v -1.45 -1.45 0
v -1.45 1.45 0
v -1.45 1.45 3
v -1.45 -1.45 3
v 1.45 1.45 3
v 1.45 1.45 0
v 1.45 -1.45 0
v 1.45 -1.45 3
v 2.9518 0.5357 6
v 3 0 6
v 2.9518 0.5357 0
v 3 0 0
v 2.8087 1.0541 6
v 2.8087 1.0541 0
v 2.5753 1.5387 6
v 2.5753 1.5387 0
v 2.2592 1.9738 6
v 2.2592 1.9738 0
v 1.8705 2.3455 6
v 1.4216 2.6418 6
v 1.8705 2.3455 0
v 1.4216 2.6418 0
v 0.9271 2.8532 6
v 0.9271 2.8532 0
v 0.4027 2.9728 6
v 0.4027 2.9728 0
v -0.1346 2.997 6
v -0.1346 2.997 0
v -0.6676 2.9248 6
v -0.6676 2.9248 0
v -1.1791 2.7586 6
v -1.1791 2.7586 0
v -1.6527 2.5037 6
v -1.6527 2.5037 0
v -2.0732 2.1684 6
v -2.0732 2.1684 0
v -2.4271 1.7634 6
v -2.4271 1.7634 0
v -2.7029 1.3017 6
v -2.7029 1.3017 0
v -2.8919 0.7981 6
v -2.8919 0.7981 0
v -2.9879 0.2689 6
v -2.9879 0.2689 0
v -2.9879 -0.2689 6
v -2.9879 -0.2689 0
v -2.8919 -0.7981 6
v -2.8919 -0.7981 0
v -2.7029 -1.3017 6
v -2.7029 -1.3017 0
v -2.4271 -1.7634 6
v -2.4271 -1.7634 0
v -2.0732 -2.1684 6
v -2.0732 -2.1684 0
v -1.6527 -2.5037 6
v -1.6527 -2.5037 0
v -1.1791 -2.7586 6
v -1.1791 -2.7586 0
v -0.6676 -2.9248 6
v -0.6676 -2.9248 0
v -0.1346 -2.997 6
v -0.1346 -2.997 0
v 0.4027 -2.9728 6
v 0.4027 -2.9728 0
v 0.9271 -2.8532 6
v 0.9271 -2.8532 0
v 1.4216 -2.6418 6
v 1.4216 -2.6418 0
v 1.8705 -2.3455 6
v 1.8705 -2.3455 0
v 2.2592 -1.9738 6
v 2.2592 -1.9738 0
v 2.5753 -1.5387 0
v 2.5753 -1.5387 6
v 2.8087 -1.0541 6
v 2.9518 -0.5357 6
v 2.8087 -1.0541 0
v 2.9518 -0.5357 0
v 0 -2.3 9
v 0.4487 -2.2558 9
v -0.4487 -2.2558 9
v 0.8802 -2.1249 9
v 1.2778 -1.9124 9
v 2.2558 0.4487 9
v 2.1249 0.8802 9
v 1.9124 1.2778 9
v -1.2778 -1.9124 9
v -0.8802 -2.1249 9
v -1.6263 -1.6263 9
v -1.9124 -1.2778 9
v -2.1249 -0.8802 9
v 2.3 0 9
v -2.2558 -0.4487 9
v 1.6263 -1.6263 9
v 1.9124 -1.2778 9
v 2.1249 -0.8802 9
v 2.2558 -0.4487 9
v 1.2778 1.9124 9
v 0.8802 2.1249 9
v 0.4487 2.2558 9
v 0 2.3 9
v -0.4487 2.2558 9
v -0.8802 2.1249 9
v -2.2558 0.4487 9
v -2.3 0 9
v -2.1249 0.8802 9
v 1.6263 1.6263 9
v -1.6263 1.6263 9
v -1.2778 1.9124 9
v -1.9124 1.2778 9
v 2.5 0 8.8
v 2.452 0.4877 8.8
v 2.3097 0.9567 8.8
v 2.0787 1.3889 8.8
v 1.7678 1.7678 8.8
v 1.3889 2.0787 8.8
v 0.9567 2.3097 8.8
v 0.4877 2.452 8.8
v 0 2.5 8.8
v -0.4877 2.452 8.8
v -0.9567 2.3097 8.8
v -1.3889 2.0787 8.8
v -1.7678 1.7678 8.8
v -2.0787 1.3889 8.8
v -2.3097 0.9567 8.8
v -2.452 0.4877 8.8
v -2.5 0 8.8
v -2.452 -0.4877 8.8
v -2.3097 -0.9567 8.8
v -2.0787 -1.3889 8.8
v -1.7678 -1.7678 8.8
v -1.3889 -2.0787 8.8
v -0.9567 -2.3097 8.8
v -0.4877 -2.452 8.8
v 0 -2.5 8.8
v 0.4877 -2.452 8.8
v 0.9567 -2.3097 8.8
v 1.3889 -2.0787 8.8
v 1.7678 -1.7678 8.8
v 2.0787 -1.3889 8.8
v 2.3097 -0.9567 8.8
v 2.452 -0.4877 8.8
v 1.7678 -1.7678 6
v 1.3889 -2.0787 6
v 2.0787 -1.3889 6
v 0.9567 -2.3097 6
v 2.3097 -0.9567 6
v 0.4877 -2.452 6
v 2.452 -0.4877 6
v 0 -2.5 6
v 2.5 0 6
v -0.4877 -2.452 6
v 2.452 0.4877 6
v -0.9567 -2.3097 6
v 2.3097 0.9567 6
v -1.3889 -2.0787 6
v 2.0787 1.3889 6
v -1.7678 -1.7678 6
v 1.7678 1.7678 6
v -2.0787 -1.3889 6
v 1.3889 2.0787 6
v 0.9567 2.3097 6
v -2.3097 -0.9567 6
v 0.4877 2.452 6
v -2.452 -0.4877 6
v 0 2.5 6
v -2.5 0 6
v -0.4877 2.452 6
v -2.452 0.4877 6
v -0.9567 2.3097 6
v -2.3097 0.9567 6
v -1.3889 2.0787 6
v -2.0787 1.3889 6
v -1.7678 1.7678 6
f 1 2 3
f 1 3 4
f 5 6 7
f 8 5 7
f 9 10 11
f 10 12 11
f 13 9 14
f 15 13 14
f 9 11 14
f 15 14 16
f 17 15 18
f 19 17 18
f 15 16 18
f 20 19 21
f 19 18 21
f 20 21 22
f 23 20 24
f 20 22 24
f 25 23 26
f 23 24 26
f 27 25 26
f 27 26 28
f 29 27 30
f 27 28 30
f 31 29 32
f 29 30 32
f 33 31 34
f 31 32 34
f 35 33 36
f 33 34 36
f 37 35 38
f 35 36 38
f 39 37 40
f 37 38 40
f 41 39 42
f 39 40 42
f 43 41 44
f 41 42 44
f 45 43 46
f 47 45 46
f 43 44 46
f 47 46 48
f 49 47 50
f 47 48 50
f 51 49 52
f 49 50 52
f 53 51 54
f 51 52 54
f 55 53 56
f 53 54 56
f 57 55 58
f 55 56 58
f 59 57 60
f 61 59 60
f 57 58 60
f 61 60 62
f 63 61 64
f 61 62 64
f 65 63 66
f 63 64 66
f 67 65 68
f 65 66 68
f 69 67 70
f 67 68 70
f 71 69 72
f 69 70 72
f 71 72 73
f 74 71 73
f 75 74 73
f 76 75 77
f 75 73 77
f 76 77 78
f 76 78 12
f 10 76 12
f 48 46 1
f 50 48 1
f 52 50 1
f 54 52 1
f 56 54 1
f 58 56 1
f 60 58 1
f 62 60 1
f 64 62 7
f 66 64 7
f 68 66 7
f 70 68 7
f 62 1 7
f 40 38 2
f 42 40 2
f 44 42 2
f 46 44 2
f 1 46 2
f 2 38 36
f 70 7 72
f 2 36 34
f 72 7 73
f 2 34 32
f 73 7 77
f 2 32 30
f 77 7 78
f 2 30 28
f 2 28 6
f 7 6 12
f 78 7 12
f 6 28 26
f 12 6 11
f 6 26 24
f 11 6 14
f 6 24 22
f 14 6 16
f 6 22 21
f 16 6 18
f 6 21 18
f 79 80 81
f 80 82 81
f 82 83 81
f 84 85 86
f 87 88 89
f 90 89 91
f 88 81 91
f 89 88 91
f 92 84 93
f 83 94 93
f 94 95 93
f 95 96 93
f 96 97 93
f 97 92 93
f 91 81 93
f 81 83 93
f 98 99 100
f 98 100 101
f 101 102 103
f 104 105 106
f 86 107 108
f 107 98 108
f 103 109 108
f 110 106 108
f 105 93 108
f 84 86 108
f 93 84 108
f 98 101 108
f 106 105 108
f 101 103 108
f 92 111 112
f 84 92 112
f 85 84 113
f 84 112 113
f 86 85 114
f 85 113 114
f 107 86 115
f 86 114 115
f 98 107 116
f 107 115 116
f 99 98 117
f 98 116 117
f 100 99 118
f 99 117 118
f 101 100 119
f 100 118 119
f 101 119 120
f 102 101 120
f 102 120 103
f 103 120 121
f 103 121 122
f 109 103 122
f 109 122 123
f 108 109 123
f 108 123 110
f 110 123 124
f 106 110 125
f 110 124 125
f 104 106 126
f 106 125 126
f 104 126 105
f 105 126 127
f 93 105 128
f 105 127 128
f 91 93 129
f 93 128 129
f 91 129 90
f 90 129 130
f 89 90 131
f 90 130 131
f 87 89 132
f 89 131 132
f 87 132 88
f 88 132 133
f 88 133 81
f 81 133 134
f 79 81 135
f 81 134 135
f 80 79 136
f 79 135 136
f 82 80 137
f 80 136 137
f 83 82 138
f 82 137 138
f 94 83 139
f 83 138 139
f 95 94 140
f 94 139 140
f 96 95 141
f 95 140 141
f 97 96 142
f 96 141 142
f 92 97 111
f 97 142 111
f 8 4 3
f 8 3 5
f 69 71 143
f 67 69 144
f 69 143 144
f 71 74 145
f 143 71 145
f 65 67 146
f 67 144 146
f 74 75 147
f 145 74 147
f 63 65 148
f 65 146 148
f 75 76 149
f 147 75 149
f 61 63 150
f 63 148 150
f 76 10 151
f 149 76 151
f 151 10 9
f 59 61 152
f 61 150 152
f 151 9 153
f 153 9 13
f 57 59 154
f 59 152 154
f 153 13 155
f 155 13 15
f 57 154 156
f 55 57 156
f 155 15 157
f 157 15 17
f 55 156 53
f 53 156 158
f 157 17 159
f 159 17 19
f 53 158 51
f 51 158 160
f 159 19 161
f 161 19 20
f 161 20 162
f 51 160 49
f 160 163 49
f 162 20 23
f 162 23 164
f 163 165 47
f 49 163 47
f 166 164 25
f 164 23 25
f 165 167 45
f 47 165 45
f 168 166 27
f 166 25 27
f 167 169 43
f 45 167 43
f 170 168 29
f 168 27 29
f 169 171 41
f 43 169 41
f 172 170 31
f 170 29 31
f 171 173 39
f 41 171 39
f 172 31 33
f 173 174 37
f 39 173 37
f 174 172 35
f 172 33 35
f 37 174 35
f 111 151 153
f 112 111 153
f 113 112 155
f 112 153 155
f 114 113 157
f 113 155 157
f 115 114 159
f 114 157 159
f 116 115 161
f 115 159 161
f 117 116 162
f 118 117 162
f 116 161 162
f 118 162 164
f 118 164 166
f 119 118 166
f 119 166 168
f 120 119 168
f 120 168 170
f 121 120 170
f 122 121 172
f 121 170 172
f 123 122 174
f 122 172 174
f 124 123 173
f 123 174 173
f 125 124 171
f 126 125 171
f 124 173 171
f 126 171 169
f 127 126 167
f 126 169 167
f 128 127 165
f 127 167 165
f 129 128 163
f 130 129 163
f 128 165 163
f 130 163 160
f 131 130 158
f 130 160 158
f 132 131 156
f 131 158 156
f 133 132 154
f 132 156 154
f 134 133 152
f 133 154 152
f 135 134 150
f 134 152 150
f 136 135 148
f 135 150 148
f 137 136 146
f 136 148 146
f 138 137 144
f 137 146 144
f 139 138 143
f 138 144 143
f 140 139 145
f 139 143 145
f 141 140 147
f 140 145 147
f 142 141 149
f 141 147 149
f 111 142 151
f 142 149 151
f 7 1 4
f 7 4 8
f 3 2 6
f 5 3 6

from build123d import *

# Parameters (mm, degrees)
SKETCH001_W  = 2.9
SKETCH001_H  = 2.9
POCKET_DEPTH = 3
CHAMFER_SIZE = 0.2


with BuildPart() as part:
    # Sketch → Revolution (revolve)
    with BuildSketch(Plane.XZ):
        Polygon((0, 9), (2.5, 9), (2.5, 6), (3, 6), (3, 0), (0, 0), align=None)
    revolve(axis=Axis((0, 0, 0), (0, 0, 1)))

    # Sketch001 (on Face5 of Revolution) → Pocket (cut)
    with BuildSketch(Plane(origin=(0, 0, 0), x_dir=(1, 0, 0), z_dir=(0, 0, -1))):
        Rectangle(SKETCH001_W, SKETCH001_H)
    extrude(amount=-POCKET_DEPTH, mode=Mode.SUBTRACT)

    # Chamfer
    chamfer_edges = [part.edges().sort_by_distance(p)[0] for p in [
        (-2.5, 0, 9),
    ]]
    chamfer(chamfer_edges, length=CHAMFER_SIZE)


solid = part.part
